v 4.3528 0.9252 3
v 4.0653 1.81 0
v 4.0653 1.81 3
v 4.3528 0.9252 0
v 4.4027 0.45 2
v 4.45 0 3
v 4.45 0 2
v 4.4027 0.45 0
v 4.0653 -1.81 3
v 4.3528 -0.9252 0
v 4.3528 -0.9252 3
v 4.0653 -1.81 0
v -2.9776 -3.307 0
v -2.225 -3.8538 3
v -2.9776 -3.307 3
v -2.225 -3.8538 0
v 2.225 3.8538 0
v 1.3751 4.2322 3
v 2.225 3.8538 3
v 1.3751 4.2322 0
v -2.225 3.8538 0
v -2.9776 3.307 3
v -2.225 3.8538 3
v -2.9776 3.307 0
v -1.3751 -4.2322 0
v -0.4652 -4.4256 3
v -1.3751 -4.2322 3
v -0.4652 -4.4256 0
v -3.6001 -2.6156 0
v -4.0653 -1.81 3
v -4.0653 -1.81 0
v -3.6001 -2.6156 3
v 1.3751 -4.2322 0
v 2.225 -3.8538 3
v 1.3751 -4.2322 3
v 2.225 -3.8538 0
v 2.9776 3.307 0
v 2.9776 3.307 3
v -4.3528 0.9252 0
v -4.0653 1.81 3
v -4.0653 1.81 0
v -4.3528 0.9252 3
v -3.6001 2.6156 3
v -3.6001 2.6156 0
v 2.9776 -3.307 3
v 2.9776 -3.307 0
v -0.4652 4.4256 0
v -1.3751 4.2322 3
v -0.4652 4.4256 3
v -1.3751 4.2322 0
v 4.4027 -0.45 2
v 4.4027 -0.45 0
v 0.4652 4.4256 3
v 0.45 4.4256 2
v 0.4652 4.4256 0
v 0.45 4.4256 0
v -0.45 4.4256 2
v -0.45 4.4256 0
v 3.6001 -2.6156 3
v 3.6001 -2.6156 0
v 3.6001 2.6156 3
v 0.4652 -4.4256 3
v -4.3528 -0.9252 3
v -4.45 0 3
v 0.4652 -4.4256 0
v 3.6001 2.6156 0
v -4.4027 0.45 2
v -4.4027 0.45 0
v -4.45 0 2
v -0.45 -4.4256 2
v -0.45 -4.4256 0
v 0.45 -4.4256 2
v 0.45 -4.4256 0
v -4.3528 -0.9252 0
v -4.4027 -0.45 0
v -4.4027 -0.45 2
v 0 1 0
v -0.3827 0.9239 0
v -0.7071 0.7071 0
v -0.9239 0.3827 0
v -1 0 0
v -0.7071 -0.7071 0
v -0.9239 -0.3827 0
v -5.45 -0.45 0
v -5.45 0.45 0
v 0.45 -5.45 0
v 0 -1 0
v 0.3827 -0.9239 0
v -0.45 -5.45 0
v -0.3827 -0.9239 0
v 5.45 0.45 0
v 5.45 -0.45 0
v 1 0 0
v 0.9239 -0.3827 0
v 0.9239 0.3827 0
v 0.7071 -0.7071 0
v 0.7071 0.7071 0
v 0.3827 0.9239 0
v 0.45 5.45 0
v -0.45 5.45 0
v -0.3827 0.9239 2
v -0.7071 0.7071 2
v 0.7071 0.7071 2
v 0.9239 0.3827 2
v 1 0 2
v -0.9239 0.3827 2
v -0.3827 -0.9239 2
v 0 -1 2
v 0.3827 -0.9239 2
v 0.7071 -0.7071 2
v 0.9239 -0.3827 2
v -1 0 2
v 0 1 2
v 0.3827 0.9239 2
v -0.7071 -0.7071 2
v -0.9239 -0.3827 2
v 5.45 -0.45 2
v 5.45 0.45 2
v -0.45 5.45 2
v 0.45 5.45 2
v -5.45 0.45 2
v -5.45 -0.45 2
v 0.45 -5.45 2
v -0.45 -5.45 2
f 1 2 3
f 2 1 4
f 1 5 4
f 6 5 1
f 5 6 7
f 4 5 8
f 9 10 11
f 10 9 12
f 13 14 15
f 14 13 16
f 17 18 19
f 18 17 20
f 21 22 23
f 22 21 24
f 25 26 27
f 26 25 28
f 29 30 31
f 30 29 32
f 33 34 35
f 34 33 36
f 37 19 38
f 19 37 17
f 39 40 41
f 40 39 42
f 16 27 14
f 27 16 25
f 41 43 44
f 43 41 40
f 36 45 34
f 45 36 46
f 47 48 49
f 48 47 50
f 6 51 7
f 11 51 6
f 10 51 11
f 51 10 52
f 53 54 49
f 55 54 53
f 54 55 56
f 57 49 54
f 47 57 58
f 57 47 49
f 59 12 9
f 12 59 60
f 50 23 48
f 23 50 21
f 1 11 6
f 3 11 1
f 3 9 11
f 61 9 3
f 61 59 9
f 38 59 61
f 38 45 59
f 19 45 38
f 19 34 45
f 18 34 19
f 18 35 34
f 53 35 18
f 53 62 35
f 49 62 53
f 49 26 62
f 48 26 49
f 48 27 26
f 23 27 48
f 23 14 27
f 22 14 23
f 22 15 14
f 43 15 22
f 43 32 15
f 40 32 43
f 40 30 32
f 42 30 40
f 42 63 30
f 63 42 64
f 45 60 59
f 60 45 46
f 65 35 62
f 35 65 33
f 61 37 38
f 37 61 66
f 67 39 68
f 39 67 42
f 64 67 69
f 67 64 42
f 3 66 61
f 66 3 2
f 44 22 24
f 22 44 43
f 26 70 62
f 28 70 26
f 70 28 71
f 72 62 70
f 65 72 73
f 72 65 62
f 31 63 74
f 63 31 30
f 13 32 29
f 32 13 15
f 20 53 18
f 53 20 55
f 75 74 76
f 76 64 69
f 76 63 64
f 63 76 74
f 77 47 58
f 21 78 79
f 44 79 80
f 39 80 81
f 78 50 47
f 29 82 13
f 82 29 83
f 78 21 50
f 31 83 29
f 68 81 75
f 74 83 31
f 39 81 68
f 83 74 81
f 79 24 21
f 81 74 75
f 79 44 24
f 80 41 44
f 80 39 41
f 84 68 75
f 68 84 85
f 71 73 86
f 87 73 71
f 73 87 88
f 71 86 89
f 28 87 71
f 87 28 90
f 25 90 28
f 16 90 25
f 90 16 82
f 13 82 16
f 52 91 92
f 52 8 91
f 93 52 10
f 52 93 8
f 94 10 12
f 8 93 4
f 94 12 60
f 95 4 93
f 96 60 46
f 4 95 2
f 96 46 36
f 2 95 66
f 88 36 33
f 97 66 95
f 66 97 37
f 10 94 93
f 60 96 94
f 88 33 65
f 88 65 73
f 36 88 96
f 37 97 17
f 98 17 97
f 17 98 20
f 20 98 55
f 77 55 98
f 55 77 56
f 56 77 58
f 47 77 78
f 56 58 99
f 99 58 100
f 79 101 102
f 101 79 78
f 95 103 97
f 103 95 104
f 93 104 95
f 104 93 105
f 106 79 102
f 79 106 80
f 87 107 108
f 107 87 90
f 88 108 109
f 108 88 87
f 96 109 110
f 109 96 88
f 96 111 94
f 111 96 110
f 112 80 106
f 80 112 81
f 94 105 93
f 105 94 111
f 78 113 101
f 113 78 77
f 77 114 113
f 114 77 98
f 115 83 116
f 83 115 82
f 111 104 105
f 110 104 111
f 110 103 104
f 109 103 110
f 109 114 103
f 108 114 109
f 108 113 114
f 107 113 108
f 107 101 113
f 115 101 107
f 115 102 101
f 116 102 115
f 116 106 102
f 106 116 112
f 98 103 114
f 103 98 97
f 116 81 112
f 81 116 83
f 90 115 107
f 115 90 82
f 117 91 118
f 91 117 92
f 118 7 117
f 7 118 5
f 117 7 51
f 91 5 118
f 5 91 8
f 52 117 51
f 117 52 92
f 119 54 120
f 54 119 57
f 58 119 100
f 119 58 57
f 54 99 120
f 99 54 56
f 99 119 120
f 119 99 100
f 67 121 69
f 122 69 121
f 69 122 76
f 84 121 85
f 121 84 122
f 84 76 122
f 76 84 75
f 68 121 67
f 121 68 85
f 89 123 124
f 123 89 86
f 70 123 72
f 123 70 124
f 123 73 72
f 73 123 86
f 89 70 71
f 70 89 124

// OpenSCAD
$fs = 0.4;

R = 8.9/2;      // Button radius.
WALLS = 1;      // Case wall thickness.
HPCB = 3;       // Height of the button PCB.
SPACE = 6;      // Distance between main PCB and front panel.
PRESS = 1;      // How much the button moves when pressed.
HCOL = 3;       // Height of the button's black shaft.
RCOL = 2/2;     // Radius of the button's black shaft.
WRAIL = 0.9;    // Width of the rail.

assert(SPACE-PRESS-HPCB > 0);
assert(SPACE+WALLS-PRESS-HPCB > 0);
assert(HCOL-PRESS > 0);

module rail() {
    translate([RCOL, -WRAIL/2, 0])
        cube([R-RCOL+1, WRAIL, SPACE-PRESS-HPCB]);    
}

color("#b13e53") union() {
    difference() {
        cylinder(h=SPACE+WALLS-PRESS-HPCB, r=R);
        translate([0, 0, -.1])
            cylinder(h=HCOL-PRESS+.1, r=RCOL);
    }
    rail();
    rotate(90) rail();
    rotate(180) rail();
    rotate(270) rail();
}
